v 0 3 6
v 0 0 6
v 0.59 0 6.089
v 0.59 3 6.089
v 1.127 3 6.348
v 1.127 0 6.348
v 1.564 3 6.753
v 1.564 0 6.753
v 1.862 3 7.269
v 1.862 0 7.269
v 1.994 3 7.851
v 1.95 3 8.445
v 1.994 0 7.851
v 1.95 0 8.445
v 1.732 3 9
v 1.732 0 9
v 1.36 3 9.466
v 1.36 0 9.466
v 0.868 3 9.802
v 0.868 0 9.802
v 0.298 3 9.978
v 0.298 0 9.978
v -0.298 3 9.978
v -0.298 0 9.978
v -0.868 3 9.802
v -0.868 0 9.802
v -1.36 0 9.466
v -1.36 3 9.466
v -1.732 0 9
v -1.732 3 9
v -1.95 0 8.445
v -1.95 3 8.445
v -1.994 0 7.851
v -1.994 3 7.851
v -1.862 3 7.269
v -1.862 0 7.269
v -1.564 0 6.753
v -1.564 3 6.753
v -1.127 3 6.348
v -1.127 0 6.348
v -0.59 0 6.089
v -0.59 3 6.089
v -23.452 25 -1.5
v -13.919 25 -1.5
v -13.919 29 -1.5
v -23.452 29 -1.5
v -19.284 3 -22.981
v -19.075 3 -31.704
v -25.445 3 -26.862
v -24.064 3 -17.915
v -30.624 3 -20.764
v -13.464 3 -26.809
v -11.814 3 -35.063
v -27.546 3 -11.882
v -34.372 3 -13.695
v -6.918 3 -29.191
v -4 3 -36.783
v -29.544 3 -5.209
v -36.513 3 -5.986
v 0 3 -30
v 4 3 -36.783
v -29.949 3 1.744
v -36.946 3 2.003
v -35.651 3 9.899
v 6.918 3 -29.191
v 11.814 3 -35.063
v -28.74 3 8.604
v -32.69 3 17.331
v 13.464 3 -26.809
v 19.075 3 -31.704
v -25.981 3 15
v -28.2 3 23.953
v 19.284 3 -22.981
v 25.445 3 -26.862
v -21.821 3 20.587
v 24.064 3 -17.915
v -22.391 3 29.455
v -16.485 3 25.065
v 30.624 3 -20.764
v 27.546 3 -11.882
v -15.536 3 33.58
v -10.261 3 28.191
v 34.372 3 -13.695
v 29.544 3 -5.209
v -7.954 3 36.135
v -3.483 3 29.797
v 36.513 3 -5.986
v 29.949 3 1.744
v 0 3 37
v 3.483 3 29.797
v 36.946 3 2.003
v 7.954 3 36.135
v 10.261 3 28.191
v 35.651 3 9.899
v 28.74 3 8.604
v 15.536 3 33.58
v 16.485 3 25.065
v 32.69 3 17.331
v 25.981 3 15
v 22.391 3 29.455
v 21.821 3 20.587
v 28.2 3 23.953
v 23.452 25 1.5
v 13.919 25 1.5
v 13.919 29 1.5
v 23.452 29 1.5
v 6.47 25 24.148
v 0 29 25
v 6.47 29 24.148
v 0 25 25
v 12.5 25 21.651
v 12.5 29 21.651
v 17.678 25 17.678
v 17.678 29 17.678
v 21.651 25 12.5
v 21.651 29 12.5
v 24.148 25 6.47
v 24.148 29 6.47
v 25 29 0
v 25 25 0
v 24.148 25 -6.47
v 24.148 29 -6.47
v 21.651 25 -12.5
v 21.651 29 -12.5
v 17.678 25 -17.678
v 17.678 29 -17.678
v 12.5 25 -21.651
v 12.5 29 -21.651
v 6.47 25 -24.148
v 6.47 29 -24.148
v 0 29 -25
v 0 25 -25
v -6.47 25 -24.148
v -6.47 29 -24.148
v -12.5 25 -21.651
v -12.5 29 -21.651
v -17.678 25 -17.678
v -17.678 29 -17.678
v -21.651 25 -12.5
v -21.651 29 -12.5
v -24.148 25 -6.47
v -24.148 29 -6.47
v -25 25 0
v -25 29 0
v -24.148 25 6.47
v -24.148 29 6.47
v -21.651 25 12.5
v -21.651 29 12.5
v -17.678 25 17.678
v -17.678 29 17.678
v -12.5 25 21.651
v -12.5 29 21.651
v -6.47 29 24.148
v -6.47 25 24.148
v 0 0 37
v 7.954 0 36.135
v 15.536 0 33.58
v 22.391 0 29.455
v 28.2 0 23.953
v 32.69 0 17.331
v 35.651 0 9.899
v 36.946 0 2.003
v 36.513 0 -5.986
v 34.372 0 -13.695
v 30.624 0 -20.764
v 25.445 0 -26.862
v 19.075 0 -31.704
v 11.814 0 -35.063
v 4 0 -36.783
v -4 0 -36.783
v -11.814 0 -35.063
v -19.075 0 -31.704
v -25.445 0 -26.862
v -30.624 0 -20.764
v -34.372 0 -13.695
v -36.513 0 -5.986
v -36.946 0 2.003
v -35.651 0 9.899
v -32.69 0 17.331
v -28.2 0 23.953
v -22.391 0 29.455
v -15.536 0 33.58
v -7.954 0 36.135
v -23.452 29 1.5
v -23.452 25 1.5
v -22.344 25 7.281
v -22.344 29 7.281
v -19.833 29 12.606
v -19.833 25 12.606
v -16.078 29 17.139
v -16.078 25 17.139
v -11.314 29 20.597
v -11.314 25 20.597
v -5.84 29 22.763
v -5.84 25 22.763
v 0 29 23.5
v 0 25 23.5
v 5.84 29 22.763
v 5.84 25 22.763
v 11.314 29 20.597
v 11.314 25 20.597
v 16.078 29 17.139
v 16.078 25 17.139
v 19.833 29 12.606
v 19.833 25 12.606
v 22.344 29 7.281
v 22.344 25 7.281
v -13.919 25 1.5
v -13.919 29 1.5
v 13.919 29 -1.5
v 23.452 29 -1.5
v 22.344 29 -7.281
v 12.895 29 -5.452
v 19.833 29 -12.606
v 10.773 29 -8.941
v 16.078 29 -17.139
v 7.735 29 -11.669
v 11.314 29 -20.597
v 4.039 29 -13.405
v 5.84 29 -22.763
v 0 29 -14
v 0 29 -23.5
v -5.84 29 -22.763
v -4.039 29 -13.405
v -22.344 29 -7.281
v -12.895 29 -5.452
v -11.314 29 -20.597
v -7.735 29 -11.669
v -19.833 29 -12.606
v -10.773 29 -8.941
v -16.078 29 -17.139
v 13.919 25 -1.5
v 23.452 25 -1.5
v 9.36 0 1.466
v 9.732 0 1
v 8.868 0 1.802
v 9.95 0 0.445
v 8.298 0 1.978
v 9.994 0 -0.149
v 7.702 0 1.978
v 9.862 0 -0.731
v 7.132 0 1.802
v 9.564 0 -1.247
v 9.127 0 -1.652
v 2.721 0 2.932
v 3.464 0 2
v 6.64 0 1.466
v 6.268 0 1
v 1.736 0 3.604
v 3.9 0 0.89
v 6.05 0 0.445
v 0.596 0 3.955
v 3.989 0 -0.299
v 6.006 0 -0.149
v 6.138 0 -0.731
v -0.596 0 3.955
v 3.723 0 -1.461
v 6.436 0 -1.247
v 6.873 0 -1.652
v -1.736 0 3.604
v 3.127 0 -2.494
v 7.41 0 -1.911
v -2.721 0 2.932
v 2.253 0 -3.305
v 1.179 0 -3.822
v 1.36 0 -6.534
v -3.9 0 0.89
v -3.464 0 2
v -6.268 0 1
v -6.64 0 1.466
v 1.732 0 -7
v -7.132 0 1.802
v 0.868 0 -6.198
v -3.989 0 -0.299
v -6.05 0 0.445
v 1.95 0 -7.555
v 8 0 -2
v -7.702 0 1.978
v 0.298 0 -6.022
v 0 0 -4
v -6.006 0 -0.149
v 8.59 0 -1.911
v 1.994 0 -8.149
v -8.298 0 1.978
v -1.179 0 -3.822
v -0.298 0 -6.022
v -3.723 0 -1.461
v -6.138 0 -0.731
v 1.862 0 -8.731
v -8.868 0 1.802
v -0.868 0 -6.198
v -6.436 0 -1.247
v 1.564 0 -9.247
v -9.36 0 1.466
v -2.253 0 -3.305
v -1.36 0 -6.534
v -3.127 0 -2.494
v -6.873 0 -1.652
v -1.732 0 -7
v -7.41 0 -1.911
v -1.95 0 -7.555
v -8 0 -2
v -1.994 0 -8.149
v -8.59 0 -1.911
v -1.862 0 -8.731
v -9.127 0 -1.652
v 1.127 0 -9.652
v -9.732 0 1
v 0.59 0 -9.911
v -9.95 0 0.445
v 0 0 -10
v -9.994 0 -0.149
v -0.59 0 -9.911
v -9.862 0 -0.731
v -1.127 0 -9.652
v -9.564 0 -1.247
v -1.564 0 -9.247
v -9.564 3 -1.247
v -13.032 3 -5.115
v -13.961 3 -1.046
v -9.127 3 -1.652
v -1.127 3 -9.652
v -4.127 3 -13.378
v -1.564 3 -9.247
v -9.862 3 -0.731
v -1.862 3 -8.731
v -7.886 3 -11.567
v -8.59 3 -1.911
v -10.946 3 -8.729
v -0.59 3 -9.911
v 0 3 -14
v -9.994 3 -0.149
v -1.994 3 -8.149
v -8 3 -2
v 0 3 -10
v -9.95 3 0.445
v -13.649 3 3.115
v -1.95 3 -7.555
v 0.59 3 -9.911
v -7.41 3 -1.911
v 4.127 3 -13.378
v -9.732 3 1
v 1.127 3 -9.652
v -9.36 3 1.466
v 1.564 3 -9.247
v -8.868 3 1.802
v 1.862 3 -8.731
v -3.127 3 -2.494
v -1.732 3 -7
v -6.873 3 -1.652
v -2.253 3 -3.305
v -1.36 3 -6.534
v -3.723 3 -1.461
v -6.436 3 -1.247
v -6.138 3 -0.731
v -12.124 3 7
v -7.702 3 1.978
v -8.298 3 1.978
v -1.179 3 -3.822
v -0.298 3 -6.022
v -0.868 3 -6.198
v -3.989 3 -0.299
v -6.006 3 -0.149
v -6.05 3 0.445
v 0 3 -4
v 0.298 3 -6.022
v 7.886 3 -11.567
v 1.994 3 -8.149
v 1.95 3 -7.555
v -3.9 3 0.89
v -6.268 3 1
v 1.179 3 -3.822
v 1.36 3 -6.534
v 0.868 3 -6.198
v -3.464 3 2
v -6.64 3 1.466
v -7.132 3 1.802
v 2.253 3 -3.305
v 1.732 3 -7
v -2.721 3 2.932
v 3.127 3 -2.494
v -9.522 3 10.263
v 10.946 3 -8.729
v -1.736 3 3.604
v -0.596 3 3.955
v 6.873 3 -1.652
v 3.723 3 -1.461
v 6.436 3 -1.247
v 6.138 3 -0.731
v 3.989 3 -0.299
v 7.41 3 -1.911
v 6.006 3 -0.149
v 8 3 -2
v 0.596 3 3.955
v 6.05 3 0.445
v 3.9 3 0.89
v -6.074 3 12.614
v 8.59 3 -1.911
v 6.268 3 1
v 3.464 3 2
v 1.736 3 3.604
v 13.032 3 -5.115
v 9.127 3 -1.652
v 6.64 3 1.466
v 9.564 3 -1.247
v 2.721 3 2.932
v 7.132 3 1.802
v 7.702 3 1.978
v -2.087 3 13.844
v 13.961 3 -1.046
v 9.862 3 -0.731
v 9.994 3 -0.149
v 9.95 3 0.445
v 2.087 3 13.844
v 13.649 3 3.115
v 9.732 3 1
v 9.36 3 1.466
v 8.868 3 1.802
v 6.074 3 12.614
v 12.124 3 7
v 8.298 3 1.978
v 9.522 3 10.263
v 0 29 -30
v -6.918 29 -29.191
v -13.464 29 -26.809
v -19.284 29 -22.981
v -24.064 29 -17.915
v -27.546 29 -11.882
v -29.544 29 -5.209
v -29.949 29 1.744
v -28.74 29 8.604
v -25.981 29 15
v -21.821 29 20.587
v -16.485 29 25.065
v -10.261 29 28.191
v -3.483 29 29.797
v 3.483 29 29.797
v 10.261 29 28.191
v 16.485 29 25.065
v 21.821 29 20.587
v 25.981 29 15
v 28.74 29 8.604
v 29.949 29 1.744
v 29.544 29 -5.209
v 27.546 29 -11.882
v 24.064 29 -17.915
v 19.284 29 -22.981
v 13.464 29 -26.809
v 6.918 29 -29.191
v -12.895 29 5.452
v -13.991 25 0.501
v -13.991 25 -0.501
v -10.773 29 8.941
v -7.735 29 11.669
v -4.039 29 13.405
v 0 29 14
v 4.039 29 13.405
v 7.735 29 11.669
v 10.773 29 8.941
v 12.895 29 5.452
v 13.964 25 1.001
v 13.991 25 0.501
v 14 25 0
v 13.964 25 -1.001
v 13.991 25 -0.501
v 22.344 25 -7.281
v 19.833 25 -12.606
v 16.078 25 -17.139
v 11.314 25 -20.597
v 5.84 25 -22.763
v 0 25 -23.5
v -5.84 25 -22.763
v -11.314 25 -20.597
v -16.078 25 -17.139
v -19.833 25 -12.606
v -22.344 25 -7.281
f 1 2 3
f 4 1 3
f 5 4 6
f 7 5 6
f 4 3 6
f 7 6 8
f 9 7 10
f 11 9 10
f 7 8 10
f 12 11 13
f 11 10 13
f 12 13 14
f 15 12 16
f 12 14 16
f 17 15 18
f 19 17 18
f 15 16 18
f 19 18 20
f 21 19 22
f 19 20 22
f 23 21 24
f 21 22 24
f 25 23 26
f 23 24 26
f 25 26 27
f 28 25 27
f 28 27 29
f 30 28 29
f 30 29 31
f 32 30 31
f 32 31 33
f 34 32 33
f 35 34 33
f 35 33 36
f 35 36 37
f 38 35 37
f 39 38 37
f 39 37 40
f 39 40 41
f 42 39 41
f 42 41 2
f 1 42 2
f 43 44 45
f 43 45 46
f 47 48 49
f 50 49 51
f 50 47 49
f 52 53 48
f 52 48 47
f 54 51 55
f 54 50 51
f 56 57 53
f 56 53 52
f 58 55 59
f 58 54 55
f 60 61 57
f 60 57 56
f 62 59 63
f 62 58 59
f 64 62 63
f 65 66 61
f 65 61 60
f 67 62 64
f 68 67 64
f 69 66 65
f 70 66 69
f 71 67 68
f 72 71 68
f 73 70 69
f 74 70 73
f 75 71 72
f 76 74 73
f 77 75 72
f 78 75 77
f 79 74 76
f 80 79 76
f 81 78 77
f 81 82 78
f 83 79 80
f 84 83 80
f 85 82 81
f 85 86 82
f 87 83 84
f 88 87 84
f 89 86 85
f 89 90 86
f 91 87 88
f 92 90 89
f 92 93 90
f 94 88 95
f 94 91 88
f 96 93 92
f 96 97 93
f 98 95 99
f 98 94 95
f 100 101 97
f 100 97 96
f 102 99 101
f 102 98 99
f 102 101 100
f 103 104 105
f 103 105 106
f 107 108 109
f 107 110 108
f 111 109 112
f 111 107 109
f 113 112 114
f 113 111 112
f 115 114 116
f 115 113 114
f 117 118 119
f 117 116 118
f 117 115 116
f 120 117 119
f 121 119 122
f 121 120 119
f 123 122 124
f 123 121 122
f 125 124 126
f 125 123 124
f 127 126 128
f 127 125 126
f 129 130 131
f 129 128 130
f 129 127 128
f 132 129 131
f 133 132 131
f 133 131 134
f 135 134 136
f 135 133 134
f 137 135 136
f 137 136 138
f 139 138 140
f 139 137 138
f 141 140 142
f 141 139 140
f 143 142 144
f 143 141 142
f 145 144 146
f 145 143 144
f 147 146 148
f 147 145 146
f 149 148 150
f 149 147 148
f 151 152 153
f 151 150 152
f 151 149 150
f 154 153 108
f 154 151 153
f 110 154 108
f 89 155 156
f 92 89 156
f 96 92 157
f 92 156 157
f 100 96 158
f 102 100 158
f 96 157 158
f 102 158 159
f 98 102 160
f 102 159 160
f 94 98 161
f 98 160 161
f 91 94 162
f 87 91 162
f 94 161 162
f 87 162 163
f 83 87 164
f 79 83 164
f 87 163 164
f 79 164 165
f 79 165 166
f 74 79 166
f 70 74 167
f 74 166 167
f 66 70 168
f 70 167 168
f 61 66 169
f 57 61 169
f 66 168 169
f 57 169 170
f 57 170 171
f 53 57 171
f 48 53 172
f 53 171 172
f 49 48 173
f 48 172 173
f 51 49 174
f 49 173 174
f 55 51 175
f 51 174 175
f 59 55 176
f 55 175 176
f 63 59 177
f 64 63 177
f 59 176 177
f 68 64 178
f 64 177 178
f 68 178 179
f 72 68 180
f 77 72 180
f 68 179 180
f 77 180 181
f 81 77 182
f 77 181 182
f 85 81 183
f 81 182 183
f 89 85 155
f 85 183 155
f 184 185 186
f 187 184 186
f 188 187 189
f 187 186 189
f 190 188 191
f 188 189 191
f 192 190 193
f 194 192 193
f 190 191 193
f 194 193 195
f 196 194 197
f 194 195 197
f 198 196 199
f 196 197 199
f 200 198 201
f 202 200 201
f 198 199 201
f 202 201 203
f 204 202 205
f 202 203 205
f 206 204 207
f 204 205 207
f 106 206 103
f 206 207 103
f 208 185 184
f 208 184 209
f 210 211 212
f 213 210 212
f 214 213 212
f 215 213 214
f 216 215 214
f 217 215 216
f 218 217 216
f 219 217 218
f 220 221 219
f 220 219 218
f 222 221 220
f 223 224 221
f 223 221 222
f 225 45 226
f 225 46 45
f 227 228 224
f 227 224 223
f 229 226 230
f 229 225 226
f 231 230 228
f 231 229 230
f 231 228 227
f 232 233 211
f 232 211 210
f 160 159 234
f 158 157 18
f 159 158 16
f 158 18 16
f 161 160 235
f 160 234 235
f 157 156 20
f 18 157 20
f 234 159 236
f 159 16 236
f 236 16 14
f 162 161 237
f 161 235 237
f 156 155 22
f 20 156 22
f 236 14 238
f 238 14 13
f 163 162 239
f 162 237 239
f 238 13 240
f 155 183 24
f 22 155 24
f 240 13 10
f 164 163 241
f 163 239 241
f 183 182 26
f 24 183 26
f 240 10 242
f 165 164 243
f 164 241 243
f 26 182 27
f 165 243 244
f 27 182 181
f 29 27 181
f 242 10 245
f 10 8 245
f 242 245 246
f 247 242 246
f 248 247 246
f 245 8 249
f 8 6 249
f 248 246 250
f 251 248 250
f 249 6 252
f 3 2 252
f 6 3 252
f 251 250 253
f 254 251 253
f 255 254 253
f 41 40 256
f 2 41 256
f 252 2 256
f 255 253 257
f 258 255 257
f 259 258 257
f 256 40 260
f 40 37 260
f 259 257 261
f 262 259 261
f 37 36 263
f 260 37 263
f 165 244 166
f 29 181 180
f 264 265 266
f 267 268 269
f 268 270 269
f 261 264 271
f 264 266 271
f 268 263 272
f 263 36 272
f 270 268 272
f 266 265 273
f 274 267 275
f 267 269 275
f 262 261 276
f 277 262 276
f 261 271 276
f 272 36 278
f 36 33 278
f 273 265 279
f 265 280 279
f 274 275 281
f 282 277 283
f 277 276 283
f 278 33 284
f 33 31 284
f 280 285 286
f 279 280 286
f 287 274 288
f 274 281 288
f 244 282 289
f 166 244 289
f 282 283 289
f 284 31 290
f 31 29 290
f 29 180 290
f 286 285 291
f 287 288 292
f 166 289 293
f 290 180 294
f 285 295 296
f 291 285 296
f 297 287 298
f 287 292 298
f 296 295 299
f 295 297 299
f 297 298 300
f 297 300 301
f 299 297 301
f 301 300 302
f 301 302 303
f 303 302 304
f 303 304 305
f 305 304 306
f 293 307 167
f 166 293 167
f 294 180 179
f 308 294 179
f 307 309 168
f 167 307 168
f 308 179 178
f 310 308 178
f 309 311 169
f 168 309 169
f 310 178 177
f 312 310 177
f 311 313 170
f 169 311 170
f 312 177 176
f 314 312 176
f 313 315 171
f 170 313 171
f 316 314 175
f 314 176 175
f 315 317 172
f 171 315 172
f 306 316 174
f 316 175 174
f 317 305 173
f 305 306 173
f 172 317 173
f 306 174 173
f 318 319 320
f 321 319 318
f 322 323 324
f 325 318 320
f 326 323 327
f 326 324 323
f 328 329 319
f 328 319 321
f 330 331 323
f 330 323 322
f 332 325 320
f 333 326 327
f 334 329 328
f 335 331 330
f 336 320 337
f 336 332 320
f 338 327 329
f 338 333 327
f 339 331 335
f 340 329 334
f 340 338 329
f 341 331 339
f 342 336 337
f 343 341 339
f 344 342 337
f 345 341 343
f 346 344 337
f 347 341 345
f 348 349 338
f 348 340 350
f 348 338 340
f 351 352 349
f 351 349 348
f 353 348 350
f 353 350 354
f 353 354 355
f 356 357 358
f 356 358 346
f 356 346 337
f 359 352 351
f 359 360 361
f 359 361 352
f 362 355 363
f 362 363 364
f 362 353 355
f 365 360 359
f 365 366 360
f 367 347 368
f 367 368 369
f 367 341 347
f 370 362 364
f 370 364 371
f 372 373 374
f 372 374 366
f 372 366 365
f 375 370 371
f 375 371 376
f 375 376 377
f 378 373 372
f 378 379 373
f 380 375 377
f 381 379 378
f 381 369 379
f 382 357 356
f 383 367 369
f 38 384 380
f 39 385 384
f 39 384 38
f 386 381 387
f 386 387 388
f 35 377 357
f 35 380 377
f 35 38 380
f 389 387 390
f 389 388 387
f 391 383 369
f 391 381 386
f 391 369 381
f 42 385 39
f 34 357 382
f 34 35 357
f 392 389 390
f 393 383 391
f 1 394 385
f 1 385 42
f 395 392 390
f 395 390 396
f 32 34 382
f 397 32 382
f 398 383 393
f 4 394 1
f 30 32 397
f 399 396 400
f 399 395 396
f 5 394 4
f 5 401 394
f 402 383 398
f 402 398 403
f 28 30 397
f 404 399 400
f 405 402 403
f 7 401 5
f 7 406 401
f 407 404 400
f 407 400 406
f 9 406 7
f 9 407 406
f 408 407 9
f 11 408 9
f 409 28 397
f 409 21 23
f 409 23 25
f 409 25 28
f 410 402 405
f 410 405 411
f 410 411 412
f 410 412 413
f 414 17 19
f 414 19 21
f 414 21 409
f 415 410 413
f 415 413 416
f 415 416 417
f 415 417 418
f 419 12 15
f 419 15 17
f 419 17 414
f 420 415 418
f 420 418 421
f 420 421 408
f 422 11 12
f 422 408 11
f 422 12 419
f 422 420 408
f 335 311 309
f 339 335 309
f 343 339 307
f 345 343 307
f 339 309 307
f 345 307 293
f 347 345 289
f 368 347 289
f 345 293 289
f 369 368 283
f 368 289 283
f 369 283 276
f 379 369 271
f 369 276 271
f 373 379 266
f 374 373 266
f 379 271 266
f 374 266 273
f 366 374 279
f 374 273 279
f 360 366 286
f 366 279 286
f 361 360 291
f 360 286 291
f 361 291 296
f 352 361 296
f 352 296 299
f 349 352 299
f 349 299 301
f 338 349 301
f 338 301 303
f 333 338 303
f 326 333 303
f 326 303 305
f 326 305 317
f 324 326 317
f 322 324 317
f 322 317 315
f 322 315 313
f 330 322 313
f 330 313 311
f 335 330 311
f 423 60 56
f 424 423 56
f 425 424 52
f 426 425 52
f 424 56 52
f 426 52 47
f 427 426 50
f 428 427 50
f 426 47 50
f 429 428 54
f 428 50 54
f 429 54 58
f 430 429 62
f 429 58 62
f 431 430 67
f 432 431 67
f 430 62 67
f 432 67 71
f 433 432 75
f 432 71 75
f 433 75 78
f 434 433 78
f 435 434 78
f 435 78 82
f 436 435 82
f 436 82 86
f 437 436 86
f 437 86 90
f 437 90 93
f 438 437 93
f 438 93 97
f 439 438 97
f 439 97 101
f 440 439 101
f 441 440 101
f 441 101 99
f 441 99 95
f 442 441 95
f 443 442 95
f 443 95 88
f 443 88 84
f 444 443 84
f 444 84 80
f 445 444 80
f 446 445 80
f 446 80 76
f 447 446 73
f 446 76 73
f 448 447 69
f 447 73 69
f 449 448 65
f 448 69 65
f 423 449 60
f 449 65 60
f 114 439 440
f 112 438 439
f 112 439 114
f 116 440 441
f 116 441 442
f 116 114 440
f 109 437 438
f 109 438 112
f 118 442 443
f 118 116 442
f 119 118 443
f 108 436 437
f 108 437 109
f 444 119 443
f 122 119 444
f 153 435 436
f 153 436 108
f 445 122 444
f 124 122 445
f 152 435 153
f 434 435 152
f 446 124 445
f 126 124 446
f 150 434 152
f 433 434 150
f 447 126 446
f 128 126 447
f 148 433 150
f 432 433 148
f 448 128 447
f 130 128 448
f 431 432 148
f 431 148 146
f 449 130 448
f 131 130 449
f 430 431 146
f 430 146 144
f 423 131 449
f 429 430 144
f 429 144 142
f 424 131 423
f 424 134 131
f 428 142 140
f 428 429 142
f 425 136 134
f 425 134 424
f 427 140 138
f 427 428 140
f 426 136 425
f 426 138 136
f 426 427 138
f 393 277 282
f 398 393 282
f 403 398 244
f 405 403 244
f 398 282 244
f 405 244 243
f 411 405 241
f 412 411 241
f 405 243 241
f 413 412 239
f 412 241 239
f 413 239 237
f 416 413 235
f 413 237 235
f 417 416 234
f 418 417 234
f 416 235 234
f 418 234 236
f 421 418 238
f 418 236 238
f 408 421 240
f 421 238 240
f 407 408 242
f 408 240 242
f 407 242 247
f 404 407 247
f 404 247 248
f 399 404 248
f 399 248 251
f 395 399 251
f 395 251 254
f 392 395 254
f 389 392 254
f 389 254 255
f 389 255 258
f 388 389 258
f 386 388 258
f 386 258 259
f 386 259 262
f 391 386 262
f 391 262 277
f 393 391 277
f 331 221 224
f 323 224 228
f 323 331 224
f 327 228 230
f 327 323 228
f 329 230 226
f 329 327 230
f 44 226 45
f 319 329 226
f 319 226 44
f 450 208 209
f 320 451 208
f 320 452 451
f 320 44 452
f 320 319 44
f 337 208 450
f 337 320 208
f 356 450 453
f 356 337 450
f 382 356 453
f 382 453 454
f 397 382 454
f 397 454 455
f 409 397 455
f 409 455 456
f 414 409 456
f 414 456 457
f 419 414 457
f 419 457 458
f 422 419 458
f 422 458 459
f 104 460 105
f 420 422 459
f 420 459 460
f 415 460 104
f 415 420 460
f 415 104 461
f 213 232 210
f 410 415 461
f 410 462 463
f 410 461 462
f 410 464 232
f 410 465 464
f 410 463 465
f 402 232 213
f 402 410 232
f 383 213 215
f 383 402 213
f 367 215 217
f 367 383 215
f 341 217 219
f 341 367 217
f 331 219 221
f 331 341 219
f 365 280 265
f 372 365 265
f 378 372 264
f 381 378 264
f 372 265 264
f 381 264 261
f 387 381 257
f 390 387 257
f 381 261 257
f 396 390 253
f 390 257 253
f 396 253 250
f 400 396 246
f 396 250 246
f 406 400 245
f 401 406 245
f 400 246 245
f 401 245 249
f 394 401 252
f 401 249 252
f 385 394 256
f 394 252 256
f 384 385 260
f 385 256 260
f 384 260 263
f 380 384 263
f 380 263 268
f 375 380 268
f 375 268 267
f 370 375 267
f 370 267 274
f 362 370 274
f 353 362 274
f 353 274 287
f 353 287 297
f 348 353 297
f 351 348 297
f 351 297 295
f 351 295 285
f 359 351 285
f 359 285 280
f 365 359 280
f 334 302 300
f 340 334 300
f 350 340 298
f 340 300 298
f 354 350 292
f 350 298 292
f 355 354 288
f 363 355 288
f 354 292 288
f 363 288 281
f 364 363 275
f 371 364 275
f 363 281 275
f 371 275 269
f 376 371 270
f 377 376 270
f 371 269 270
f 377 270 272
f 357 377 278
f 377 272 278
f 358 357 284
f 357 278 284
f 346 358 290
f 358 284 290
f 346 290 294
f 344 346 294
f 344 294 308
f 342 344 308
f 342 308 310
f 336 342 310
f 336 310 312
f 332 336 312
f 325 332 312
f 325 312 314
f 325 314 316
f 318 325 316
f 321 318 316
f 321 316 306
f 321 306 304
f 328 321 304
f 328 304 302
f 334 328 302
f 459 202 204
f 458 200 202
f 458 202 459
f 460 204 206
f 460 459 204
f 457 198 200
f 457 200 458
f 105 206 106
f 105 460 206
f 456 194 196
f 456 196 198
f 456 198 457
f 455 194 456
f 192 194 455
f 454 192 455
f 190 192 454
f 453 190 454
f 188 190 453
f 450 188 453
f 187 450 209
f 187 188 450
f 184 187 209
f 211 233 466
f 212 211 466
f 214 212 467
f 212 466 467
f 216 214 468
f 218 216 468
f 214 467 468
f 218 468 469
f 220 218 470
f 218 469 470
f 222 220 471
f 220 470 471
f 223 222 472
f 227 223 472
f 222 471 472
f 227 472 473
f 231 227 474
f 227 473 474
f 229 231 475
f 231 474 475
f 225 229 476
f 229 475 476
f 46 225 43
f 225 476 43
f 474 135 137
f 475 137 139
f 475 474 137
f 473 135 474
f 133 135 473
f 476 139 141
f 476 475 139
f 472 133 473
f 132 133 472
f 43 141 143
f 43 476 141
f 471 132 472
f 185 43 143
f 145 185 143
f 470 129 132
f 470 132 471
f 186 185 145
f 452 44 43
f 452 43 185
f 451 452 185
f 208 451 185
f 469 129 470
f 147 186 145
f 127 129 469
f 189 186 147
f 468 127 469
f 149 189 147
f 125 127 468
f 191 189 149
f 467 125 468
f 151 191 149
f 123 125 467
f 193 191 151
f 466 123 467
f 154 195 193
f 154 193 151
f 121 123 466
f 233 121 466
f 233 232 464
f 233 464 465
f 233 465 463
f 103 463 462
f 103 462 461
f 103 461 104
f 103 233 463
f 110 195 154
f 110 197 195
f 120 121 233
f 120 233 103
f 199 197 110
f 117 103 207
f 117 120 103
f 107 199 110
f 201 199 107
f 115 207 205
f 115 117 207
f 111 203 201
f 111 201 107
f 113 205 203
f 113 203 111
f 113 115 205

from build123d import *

# Parameters (mm, degrees)
SKETCH1_R           = 37
BOSS_EXTRUDE1_DEPTH = 3
SKETCH1_3_R         = 30
SKETCH1_3_R_2       = 14
BOSS_EXTRUDE2_DEPTH = 29
CUT_EXTRUDE1_START  = -4
SKETCH2_R           = 25
SKETCH2_R_2         = 23.5
CUT_EXTRUDE1_DEPTH  = 4
SKETCH3_R           = 4
SKETCH3_R_2         = 2
CUT_EXTRUDE2_DEPTH  = 4


with BuildPart() as part:
    # Sketch1 → Boss-Extrude1 (new body)
    with BuildSketch(Plane(origin=(0, 0, 0), x_dir=(1, 0, 0), z_dir=(0, 1, 0))):
        with Locations(Location((0, 0, 0), (0, 0, 270))):
            Circle(SKETCH1_R)
    extrude(amount=BOSS_EXTRUDE1_DEPTH)

    # Sketch1<3> → Boss-Extrude2 (add)
    with BuildSketch(Plane(origin=(0, 0, 0), x_dir=(1, 0, 0), z_dir=(0, 1, 0))):
        with Locations(Location((0, 0, 0), (0, 0, 90))):
            Circle(SKETCH1_3_R)
        with Locations(Location((0, 0, 0), (0, 0, 90))):
            Circle(SKETCH1_3_R_2, mode=Mode.SUBTRACT)
    extrude(amount=BOSS_EXTRUDE2_DEPTH)

    # Sketch2 → Cut-Extrude1 (cut)
    # profile 1 of 10: a face of its own
    with BuildSketch(Plane(origin=(0, 29, 0), x_dir=(1, 0, 0), z_dir=(0, 1, 0)).offset(CUT_EXTRUDE1_START)):
        with Locations(Location((0, 0, 0), (0, 0, 270))):
            Circle(SKETCH2_R)
        Circle(SKETCH2_R_2, mode=Mode.SUBTRACT)
    # profile 2 of 10: a face of its own
    with BuildSketch(Plane(origin=(0, 29, 0), x_dir=(1, 0, 0), z_dir=(0, 1, 0)).offset(CUT_EXTRUDE1_START)):
        with BuildLine():
            ThreePointArc((24.954959427, 1.5), (0, 25), (-24.954959427, 1.5))
            Line((-24.954959427, 1.5), (-23.452078799, 1.5))
            ThreePointArc((-23.452078799, 1.5), (0, 23.5), (23.452078799, 1.5))
            Line((23.452078799, 1.5), (24.954959427, 1.5))
        make_face()
    # profile 3 of 10: a face of its own
    with BuildSketch(Plane(origin=(0, 29, 0), x_dir=(1, 0, 0), z_dir=(0, 1, 0)).offset(CUT_EXTRUDE1_START)):
        with BuildLine():
            ThreePointArc((-24.954959427, 1.5), (-25, 0), (-24.954959427, -1.5))
            Line((-24.954959427, -1.5), (-23.452078799, -1.5))
            ThreePointArc((-23.452078799, -1.5), (-23.5, 0), (-23.452078799, 1.5))
            Line((-23.452078799, 1.5), (-24.954959427, 1.5))
        make_face()
    # profile 4 of 10: a face of its own
    with BuildSketch(Plane(origin=(0, 29, 0), x_dir=(1, 0, 0), z_dir=(0, 1, 0)).offset(CUT_EXTRUDE1_START)):
        with BuildLine():
            Line((23.452078799, -1.5), (24.954959427, -1.5))
            ThreePointArc((24.954959427, -1.5), (24.98873732, -0.750338033), (25, 0))
            ThreePointArc((25, 0), (24.98873732, 0.750338033), (24.954959427, 1.5))
            Line((24.954959427, 1.5), (23.452078799, 1.5))
            ThreePointArc((23.452078799, 1.5), (23.488016644, 0.750382643), (23.5, 0))
            ThreePointArc((23.5, 0), (23.488016644, -0.750382643), (23.452078799, -1.5))
        make_face()
    # profile 5 of 10: a face of its own
    with BuildSketch(Plane(origin=(0, 29, 0), x_dir=(1, 0, 0), z_dir=(0, 1, 0)).offset(CUT_EXTRUDE1_START)):
        with BuildLine():
            ThreePointArc((-23.452078799, 1.5), (-23.5, 0), (-23.452078799, -1.5))
            Line((-23.452078799, -1.5), (-13.919410907, -1.5))
            ThreePointArc((-13.919410907, -1.5), (-14, 0), (-13.919410907, 1.5))
            Line((-13.919410907, 1.5), (-23.452078799, 1.5))
        make_face()
    # profile 6 of 10: a face of its own
    with BuildSketch(Plane(origin=(0, 29, 0), x_dir=(1, 0, 0), z_dir=(0, 1, 0)).offset(CUT_EXTRUDE1_START)):
        with BuildLine():
            Line((13.919410907, -1.5), (23.452078799, -1.5))
            ThreePointArc((23.452078799, -1.5), (23.488016644, -0.750382643), (23.5, 0))
            ThreePointArc((23.5, 0), (23.488016644, 0.750382643), (23.452078799, 1.5))
            Line((23.452078799, 1.5), (13.919410907, 1.5))
            ThreePointArc((13.919410907, 1.5), (13.979838209, 0.751081654), (14, 0))
            ThreePointArc((14, 0), (13.979838209, -0.751081654), (13.919410907, -1.5))
        make_face()
    # profile 7 of 10: a face of its own
    with BuildSketch(Plane(origin=(0, 29, 0), x_dir=(1, 0, 0), z_dir=(0, 1, 0)).offset(CUT_EXTRUDE1_START)):
        with BuildLine():
            ThreePointArc((-23.452078799, 1.5), (-23.5, 0), (-23.452078799, -1.5))
            Line((-23.452078799, -1.5), (-13.919410907, -1.5))
            ThreePointArc((-13.919410907, -1.5), (-14, 0), (-13.919410907, 1.5))
            Line((-13.919410907, 1.5), (-23.452078799, 1.5))
        make_face()
    # profile 8 of 10: a face of its own
    with BuildSketch(Plane(origin=(0, 29, 0), x_dir=(1, 0, 0), z_dir=(0, 1, 0)).offset(CUT_EXTRUDE1_START)):
        with BuildLine():
            Line((13.919410907, -1.5), (23.452078799, -1.5))
            ThreePointArc((23.452078799, -1.5), (23.488016644, -0.750382643), (23.5, 0))
            ThreePointArc((23.5, 0), (23.488016644, 0.750382643), (23.452078799, 1.5))
            Line((23.452078799, 1.5), (13.919410907, 1.5))
            ThreePointArc((13.919410907, 1.5), (13.979838209, 0.751081654), (14, 0))
            ThreePointArc((14, 0), (13.979838209, -0.751081654), (13.919410907, -1.5))
        make_face()
    # profile 9 of 10: a face of its own
    with BuildSketch(Plane(origin=(0, 29, 0), x_dir=(1, 0, 0), z_dir=(0, 1, 0)).offset(CUT_EXTRUDE1_START)):
        with BuildLine():
            ThreePointArc((-24.954959427, 1.5), (-25, 0), (-24.954959427, -1.5))
            Line((-24.954959427, -1.5), (-23.452078799, -1.5))
            ThreePointArc((-23.452078799, -1.5), (-23.5, 0), (-23.452078799, 1.5))
            Line((-23.452078799, 1.5), (-24.954959427, 1.5))
        make_face()
    # profile 10 of 10: a face of its own
    with BuildSketch(Plane(origin=(0, 29, 0), x_dir=(1, 0, 0), z_dir=(0, 1, 0)).offset(CUT_EXTRUDE1_START)):
        with BuildLine():
            Line((23.452078799, -1.5), (24.954959427, -1.5))
            ThreePointArc((24.954959427, -1.5), (24.98873732, -0.750338033), (25, 0))
            ThreePointArc((25, 0), (24.98873732, 0.750338033), (24.954959427, 1.5))
            Line((24.954959427, 1.5), (23.452078799, 1.5))
            ThreePointArc((23.452078799, 1.5), (23.488016644, 0.750382643), (23.5, 0))
            ThreePointArc((23.5, 0), (23.488016644, -0.750382643), (23.452078799, -1.5))
        make_face()
    extrude(amount=CUT_EXTRUDE1_DEPTH, mode=Mode.SUBTRACT)

    # Sketch3 → Cut-Extrude2 (cut)
    with BuildSketch(Plane.XZ):
        with Locations(Location((0, 0, 0), (0, 0, 270))):
            Circle(SKETCH3_R)
        with Locations(Location((-8, 0, 0), (0, 0, 270))):
            Circle(SKETCH3_R_2)
        with Locations(Location((0, 8, 0), (0, 0, 270))):
            Circle(SKETCH3_R_2)
        with Locations(Location((8, 0, 0), (0, 0, 270))):
            Circle(SKETCH3_R_2)
        with Locations(Location((0, -8, 0), (0, 0, 270))):
            Circle(SKETCH3_R_2)
    extrude(amount=-CUT_EXTRUDE2_DEPTH, mode=Mode.SUBTRACT)


solid = part.part
